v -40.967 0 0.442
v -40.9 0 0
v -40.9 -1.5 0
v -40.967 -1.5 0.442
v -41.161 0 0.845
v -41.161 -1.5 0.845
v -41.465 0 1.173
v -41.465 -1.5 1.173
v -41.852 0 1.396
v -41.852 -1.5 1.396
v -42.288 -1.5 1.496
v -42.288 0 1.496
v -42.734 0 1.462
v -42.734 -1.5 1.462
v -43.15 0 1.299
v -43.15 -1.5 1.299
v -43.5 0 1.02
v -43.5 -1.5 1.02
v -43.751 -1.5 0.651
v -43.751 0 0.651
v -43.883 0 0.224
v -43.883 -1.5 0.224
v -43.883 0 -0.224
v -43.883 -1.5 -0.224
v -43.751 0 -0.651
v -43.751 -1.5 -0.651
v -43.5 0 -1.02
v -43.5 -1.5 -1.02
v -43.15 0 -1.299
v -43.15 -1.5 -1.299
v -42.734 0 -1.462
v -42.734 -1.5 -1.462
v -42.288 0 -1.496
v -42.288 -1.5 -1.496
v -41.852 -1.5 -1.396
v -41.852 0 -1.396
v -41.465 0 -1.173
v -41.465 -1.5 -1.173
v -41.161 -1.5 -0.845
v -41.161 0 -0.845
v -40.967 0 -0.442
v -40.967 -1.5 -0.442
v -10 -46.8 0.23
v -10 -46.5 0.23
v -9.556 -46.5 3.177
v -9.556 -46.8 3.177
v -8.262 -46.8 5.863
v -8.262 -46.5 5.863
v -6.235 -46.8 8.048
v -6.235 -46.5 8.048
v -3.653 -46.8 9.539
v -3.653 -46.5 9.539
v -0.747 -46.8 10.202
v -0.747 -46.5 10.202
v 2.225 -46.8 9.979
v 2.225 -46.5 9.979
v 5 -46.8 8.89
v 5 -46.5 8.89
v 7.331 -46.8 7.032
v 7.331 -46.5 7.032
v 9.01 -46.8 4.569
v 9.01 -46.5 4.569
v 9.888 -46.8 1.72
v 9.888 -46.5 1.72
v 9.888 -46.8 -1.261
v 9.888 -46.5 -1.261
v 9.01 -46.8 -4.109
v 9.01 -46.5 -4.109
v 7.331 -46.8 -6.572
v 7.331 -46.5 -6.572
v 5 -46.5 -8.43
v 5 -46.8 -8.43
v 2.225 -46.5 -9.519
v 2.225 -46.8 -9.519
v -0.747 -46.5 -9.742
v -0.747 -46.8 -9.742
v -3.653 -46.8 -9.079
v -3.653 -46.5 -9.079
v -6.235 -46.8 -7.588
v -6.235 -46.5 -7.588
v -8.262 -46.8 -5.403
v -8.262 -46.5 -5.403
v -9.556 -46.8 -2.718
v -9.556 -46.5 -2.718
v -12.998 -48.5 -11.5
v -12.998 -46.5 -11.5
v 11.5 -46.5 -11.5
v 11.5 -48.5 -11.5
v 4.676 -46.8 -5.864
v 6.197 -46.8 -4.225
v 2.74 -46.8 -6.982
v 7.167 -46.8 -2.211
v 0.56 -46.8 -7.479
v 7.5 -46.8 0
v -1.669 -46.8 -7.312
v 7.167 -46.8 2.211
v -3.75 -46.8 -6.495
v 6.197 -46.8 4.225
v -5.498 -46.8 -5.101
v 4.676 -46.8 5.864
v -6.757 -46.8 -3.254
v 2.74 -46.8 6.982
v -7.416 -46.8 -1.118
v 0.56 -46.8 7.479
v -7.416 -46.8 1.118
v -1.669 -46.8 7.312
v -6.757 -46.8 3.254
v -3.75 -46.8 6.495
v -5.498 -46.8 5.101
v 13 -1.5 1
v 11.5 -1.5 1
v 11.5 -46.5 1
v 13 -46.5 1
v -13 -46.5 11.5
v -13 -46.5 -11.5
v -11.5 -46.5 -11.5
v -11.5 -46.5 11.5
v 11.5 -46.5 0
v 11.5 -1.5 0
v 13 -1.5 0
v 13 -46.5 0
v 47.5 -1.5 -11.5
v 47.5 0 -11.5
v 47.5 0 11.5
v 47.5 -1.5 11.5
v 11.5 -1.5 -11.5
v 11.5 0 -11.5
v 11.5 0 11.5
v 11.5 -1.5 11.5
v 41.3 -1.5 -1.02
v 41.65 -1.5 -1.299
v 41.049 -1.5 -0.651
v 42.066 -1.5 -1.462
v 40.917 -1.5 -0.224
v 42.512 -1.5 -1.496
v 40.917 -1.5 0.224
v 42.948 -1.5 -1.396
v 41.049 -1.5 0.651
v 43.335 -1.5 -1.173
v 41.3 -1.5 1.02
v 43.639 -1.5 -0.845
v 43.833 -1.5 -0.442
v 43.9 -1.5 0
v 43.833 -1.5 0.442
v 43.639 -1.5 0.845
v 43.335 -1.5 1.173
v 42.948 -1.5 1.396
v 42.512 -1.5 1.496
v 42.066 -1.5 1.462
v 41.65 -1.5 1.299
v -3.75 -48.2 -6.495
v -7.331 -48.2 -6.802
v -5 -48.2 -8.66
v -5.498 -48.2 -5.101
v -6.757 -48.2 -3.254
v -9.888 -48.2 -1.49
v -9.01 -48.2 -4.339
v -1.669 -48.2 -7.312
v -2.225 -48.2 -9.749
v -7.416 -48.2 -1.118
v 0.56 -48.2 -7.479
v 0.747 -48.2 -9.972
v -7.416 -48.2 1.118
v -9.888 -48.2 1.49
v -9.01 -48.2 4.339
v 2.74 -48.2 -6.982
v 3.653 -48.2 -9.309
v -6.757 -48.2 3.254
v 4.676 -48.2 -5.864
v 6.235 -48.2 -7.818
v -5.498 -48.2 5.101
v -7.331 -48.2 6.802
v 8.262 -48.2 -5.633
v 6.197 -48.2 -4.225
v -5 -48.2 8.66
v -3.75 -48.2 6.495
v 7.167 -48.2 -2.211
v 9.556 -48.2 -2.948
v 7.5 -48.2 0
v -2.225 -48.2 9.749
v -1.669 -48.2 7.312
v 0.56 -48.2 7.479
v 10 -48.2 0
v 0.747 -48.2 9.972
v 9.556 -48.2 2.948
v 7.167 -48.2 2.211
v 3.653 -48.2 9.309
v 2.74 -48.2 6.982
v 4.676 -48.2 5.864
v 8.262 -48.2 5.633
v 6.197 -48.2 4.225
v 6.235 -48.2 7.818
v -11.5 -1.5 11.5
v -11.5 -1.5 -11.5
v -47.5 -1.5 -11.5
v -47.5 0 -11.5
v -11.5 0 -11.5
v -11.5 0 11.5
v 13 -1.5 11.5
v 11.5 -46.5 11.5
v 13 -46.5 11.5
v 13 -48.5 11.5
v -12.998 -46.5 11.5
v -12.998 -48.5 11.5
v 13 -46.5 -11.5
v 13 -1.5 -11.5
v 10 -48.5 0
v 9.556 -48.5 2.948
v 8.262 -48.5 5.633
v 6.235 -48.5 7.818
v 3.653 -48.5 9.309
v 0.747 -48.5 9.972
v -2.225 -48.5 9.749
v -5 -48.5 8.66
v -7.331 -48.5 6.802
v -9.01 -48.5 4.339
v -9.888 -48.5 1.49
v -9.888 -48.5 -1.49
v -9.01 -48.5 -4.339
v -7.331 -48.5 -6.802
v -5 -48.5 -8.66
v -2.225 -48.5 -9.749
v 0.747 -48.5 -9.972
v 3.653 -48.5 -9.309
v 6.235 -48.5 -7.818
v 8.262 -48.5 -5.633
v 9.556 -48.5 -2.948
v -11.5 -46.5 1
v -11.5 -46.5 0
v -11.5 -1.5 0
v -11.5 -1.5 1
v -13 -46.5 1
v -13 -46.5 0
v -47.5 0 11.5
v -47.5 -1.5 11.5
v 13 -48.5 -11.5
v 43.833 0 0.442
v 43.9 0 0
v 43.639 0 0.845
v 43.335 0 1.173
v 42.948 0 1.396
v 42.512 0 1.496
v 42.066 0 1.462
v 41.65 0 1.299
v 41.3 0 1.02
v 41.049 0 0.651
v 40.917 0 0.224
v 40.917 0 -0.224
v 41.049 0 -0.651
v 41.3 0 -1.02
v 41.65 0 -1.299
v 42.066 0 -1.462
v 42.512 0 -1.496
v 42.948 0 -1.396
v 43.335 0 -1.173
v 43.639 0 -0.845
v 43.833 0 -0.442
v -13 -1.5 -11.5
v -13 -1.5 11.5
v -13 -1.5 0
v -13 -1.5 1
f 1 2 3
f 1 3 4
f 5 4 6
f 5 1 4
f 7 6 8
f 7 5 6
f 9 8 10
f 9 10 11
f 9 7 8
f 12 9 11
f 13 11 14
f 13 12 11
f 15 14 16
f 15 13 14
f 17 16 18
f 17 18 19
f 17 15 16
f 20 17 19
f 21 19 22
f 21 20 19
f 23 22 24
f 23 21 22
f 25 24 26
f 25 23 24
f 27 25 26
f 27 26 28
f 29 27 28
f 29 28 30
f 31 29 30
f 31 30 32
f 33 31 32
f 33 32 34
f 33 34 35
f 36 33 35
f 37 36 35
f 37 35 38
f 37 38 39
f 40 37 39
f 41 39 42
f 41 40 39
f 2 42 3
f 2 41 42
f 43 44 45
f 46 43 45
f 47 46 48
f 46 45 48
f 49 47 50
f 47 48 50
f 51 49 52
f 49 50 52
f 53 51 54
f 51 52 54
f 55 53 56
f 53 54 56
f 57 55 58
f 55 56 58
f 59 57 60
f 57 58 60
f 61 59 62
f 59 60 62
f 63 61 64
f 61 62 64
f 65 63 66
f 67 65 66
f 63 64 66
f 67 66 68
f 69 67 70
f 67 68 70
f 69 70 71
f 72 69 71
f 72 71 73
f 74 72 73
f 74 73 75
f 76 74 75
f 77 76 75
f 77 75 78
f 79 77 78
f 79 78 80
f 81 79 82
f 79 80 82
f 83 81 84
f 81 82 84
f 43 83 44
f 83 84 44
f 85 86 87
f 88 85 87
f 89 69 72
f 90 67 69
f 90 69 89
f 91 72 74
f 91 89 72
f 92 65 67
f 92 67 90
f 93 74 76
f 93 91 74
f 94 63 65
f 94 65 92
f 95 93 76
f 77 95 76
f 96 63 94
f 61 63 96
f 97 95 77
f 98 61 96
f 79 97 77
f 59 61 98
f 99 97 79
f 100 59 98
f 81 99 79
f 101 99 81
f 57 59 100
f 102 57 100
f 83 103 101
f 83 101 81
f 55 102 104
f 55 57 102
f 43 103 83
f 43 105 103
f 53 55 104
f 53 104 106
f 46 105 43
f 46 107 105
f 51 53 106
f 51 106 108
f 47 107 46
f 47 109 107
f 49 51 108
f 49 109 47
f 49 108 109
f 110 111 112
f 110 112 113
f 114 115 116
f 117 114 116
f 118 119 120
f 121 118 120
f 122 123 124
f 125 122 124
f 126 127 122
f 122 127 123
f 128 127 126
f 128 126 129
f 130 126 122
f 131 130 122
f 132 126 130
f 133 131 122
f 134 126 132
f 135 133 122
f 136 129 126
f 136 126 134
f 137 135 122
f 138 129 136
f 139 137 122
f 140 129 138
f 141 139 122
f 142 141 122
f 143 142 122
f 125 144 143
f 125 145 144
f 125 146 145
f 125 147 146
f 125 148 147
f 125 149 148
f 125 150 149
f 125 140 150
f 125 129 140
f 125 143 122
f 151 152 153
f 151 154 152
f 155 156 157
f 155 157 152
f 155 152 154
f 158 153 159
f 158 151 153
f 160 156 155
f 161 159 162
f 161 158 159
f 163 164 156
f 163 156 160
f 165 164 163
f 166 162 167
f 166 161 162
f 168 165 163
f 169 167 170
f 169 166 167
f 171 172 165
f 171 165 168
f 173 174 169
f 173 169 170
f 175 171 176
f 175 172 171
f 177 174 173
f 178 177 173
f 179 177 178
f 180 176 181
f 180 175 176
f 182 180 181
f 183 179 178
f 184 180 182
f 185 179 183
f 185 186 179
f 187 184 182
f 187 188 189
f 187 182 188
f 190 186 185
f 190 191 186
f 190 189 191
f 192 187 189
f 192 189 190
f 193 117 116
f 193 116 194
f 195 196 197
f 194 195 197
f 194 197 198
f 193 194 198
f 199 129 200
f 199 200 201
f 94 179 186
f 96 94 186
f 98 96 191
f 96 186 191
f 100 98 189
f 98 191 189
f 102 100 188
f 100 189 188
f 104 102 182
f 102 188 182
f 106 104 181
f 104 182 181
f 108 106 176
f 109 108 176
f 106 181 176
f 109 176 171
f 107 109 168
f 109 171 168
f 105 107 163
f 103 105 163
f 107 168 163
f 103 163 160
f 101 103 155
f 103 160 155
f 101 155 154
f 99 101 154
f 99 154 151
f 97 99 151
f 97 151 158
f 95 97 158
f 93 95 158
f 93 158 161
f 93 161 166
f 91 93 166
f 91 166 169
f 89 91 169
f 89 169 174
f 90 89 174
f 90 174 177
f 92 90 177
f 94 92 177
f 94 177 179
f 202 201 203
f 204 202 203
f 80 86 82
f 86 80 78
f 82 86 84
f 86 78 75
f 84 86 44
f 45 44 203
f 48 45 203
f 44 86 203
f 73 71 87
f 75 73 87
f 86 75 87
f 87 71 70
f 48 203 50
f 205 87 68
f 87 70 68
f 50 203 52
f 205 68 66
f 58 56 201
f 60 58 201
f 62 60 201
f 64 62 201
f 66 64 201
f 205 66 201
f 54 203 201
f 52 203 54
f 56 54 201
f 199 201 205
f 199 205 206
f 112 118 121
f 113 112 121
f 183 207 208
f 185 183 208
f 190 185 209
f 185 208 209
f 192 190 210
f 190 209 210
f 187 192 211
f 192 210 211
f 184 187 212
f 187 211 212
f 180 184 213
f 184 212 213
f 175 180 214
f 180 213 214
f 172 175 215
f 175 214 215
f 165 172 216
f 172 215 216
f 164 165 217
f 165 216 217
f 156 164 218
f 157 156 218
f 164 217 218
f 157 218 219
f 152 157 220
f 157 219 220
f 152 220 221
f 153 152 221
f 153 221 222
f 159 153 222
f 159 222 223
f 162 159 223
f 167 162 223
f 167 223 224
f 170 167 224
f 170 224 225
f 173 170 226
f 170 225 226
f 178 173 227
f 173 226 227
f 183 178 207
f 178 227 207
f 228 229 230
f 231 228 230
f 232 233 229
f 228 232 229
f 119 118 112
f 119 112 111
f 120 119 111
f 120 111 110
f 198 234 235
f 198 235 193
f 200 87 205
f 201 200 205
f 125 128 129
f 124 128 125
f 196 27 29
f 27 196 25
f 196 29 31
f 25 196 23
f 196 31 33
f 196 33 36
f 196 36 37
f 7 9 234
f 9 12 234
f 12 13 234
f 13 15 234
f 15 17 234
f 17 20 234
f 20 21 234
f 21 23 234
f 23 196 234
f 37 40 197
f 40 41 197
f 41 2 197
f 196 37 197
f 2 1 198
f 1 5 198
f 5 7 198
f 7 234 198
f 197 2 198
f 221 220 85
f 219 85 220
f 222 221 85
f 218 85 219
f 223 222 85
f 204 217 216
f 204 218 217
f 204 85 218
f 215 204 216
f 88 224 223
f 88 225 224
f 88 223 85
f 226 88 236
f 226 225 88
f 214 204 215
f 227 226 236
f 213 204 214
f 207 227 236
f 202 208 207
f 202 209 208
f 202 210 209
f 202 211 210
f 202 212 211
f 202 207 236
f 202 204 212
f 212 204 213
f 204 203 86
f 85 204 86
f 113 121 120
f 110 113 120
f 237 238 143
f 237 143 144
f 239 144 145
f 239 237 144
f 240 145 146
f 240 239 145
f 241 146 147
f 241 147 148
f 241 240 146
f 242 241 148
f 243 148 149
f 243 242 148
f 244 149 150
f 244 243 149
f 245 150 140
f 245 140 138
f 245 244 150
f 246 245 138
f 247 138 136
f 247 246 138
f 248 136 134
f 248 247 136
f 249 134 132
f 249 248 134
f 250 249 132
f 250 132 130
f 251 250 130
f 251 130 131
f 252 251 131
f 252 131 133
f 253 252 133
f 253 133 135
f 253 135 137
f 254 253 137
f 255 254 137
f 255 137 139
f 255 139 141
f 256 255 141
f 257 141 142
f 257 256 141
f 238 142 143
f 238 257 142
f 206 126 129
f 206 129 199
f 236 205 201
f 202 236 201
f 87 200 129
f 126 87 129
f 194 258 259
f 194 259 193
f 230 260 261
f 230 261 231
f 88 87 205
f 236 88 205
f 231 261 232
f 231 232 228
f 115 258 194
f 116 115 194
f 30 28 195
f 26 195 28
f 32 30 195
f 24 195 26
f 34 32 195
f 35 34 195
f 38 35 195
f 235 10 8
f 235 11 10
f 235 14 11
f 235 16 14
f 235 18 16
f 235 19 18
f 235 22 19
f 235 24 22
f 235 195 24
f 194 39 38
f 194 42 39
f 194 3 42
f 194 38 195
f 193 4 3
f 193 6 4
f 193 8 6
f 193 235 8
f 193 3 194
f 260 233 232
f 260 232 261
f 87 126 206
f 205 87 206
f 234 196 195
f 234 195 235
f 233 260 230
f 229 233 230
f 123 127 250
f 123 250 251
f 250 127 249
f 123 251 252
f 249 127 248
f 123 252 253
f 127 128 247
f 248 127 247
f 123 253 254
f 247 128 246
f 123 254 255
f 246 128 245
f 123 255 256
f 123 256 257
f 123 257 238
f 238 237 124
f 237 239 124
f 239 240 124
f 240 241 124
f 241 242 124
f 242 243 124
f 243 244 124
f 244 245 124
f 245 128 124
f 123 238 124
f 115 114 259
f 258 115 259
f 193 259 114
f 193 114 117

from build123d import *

# Parameters (mm, degrees)
F0_W      = 36
F0_H      = 23
F0_R      = 1.5
F1_DEPTH  = 1.5
F2_W      = 1.5
F2_H      = 45
F3_DEPTH  = 11.5
F4_DEPTH  = 1
F6_DEPTH  = 2
F7_R      = 10
F7_R_2    = 7.5
F8_DEPTH  = 0.3
F9_DEPTH  = 2.2
F10_R     = 10
F10_R_2   = 7.5
F11_DEPTH = 0.3


# Not quite as in the source:
# - ends of sketch curves that miss each other by under 0.0002 mm in the source are joined


with BuildPart() as f1:
    # F0 (on Front) → F1 (new body)
    with BuildSketch(Plane.XZ):
        with Locations((-29.5, 0)):
            Rectangle(F0_W, F0_H)
        with Locations((-42.4, 0)):
            Circle(F0_R, mode=Mode.SUBTRACT)
    extrude(amount=F1_DEPTH)


with BuildPart() as f1b:
    # F0 (on Front) → F1, piece 2 (new body)
    with BuildSketch(Plane.XZ):
        with Locations((29.5, 0)):
            Rectangle(F0_W, F0_H)
        with Locations((42.4, 0)):
            Circle(F0_R, mode=Mode.SUBTRACT)
    extrude(amount=F1_DEPTH)


with BuildPart() as f3:
    # F2 (on Top) → F3 (new body, symmetric)
    with BuildSketch(Plane.XY):
        with Locations((12.2499515936, -24.0000421973)):
            Rectangle(F2_W, F2_H)
    extrude(amount=F3_DEPTH, both=True)


with BuildPart() as f3b:
    # F2 (on Top) → F3, piece 2 (new body, symmetric)
    with BuildSketch(Plane.XY):
        with Locations((-12.2500094585, -24.0000799907)):
            Rectangle(F2_W, F2_H)
    extrude(amount=F3_DEPTH, both=True)


with BuildPart() as f4:
    # F2 (on Top) → F4 (new body)
    with BuildSketch(Plane.XY):
        with Locations((-12.2500094585, -24.0000799907)):
            Rectangle(F2_W, F2_H)
    extrude(amount=F4_DEPTH)


with BuildPart() as f4b:
    # F2 (on Top) → F4, piece 2 (new body)
    with BuildSketch(Plane.XY):
        with Locations((12.2499515936, -24.0000421973)):
            Rectangle(F2_W, F2_H)
    extrude(amount=F4_DEPTH)


with BuildPart() as f6:
    # F5 (on face) → F6 (new body)
    with BuildSketch(Plane.XZ.offset(46.5000421973)):
        Polygon((12.9999515936, -11.5000382066), (12.9999515936, 11.5), (11.4999515936, 11.5), (11.4999515936, -11.5), align=None)
        Polygon((11.4999515936, -11.5), (11.4999515936, 11.5), (-12.9975853488, 11.5), (-12.9975853488, -11.5000382066), align=None)
    extrude(amount=F6_DEPTH)

    # F7 (on face) → F8 (cut)
    with BuildSketch(Plane.XZ.offset(48.5000421973)):
        Circle(F7_R)
        Circle(F7_R_2, mode=Mode.SUBTRACT)
    extrude(amount=-F8_DEPTH, mode=Mode.SUBTRACT)

    # F9 (cut): a face of the model
    f9_faces = [f6.faces().sort_by_distance(p)[0] for p in [
        (0, -48.5000421973, 0),
    ]]
    extrude(f9_faces, amount=-F9_DEPTH, mode=Mode.SUBTRACT)

    # F10 (on face) → F11 (cut)
    with BuildSketch(Plane(origin=(0, -46.5000421973, 0), x_dir=(-1, 0, 0), z_dir=(0, 1, 0))):
        with Locations((0, 0.2298883747)):
            Circle(F10_R)
        Circle(F10_R_2, mode=Mode.SUBTRACT)
    extrude(amount=-F11_DEPTH, mode=Mode.SUBTRACT)


solid = Compound([f1.part, f1b.part, f3.part, f3b.part, f4.part, f4b.part, f6.part])
